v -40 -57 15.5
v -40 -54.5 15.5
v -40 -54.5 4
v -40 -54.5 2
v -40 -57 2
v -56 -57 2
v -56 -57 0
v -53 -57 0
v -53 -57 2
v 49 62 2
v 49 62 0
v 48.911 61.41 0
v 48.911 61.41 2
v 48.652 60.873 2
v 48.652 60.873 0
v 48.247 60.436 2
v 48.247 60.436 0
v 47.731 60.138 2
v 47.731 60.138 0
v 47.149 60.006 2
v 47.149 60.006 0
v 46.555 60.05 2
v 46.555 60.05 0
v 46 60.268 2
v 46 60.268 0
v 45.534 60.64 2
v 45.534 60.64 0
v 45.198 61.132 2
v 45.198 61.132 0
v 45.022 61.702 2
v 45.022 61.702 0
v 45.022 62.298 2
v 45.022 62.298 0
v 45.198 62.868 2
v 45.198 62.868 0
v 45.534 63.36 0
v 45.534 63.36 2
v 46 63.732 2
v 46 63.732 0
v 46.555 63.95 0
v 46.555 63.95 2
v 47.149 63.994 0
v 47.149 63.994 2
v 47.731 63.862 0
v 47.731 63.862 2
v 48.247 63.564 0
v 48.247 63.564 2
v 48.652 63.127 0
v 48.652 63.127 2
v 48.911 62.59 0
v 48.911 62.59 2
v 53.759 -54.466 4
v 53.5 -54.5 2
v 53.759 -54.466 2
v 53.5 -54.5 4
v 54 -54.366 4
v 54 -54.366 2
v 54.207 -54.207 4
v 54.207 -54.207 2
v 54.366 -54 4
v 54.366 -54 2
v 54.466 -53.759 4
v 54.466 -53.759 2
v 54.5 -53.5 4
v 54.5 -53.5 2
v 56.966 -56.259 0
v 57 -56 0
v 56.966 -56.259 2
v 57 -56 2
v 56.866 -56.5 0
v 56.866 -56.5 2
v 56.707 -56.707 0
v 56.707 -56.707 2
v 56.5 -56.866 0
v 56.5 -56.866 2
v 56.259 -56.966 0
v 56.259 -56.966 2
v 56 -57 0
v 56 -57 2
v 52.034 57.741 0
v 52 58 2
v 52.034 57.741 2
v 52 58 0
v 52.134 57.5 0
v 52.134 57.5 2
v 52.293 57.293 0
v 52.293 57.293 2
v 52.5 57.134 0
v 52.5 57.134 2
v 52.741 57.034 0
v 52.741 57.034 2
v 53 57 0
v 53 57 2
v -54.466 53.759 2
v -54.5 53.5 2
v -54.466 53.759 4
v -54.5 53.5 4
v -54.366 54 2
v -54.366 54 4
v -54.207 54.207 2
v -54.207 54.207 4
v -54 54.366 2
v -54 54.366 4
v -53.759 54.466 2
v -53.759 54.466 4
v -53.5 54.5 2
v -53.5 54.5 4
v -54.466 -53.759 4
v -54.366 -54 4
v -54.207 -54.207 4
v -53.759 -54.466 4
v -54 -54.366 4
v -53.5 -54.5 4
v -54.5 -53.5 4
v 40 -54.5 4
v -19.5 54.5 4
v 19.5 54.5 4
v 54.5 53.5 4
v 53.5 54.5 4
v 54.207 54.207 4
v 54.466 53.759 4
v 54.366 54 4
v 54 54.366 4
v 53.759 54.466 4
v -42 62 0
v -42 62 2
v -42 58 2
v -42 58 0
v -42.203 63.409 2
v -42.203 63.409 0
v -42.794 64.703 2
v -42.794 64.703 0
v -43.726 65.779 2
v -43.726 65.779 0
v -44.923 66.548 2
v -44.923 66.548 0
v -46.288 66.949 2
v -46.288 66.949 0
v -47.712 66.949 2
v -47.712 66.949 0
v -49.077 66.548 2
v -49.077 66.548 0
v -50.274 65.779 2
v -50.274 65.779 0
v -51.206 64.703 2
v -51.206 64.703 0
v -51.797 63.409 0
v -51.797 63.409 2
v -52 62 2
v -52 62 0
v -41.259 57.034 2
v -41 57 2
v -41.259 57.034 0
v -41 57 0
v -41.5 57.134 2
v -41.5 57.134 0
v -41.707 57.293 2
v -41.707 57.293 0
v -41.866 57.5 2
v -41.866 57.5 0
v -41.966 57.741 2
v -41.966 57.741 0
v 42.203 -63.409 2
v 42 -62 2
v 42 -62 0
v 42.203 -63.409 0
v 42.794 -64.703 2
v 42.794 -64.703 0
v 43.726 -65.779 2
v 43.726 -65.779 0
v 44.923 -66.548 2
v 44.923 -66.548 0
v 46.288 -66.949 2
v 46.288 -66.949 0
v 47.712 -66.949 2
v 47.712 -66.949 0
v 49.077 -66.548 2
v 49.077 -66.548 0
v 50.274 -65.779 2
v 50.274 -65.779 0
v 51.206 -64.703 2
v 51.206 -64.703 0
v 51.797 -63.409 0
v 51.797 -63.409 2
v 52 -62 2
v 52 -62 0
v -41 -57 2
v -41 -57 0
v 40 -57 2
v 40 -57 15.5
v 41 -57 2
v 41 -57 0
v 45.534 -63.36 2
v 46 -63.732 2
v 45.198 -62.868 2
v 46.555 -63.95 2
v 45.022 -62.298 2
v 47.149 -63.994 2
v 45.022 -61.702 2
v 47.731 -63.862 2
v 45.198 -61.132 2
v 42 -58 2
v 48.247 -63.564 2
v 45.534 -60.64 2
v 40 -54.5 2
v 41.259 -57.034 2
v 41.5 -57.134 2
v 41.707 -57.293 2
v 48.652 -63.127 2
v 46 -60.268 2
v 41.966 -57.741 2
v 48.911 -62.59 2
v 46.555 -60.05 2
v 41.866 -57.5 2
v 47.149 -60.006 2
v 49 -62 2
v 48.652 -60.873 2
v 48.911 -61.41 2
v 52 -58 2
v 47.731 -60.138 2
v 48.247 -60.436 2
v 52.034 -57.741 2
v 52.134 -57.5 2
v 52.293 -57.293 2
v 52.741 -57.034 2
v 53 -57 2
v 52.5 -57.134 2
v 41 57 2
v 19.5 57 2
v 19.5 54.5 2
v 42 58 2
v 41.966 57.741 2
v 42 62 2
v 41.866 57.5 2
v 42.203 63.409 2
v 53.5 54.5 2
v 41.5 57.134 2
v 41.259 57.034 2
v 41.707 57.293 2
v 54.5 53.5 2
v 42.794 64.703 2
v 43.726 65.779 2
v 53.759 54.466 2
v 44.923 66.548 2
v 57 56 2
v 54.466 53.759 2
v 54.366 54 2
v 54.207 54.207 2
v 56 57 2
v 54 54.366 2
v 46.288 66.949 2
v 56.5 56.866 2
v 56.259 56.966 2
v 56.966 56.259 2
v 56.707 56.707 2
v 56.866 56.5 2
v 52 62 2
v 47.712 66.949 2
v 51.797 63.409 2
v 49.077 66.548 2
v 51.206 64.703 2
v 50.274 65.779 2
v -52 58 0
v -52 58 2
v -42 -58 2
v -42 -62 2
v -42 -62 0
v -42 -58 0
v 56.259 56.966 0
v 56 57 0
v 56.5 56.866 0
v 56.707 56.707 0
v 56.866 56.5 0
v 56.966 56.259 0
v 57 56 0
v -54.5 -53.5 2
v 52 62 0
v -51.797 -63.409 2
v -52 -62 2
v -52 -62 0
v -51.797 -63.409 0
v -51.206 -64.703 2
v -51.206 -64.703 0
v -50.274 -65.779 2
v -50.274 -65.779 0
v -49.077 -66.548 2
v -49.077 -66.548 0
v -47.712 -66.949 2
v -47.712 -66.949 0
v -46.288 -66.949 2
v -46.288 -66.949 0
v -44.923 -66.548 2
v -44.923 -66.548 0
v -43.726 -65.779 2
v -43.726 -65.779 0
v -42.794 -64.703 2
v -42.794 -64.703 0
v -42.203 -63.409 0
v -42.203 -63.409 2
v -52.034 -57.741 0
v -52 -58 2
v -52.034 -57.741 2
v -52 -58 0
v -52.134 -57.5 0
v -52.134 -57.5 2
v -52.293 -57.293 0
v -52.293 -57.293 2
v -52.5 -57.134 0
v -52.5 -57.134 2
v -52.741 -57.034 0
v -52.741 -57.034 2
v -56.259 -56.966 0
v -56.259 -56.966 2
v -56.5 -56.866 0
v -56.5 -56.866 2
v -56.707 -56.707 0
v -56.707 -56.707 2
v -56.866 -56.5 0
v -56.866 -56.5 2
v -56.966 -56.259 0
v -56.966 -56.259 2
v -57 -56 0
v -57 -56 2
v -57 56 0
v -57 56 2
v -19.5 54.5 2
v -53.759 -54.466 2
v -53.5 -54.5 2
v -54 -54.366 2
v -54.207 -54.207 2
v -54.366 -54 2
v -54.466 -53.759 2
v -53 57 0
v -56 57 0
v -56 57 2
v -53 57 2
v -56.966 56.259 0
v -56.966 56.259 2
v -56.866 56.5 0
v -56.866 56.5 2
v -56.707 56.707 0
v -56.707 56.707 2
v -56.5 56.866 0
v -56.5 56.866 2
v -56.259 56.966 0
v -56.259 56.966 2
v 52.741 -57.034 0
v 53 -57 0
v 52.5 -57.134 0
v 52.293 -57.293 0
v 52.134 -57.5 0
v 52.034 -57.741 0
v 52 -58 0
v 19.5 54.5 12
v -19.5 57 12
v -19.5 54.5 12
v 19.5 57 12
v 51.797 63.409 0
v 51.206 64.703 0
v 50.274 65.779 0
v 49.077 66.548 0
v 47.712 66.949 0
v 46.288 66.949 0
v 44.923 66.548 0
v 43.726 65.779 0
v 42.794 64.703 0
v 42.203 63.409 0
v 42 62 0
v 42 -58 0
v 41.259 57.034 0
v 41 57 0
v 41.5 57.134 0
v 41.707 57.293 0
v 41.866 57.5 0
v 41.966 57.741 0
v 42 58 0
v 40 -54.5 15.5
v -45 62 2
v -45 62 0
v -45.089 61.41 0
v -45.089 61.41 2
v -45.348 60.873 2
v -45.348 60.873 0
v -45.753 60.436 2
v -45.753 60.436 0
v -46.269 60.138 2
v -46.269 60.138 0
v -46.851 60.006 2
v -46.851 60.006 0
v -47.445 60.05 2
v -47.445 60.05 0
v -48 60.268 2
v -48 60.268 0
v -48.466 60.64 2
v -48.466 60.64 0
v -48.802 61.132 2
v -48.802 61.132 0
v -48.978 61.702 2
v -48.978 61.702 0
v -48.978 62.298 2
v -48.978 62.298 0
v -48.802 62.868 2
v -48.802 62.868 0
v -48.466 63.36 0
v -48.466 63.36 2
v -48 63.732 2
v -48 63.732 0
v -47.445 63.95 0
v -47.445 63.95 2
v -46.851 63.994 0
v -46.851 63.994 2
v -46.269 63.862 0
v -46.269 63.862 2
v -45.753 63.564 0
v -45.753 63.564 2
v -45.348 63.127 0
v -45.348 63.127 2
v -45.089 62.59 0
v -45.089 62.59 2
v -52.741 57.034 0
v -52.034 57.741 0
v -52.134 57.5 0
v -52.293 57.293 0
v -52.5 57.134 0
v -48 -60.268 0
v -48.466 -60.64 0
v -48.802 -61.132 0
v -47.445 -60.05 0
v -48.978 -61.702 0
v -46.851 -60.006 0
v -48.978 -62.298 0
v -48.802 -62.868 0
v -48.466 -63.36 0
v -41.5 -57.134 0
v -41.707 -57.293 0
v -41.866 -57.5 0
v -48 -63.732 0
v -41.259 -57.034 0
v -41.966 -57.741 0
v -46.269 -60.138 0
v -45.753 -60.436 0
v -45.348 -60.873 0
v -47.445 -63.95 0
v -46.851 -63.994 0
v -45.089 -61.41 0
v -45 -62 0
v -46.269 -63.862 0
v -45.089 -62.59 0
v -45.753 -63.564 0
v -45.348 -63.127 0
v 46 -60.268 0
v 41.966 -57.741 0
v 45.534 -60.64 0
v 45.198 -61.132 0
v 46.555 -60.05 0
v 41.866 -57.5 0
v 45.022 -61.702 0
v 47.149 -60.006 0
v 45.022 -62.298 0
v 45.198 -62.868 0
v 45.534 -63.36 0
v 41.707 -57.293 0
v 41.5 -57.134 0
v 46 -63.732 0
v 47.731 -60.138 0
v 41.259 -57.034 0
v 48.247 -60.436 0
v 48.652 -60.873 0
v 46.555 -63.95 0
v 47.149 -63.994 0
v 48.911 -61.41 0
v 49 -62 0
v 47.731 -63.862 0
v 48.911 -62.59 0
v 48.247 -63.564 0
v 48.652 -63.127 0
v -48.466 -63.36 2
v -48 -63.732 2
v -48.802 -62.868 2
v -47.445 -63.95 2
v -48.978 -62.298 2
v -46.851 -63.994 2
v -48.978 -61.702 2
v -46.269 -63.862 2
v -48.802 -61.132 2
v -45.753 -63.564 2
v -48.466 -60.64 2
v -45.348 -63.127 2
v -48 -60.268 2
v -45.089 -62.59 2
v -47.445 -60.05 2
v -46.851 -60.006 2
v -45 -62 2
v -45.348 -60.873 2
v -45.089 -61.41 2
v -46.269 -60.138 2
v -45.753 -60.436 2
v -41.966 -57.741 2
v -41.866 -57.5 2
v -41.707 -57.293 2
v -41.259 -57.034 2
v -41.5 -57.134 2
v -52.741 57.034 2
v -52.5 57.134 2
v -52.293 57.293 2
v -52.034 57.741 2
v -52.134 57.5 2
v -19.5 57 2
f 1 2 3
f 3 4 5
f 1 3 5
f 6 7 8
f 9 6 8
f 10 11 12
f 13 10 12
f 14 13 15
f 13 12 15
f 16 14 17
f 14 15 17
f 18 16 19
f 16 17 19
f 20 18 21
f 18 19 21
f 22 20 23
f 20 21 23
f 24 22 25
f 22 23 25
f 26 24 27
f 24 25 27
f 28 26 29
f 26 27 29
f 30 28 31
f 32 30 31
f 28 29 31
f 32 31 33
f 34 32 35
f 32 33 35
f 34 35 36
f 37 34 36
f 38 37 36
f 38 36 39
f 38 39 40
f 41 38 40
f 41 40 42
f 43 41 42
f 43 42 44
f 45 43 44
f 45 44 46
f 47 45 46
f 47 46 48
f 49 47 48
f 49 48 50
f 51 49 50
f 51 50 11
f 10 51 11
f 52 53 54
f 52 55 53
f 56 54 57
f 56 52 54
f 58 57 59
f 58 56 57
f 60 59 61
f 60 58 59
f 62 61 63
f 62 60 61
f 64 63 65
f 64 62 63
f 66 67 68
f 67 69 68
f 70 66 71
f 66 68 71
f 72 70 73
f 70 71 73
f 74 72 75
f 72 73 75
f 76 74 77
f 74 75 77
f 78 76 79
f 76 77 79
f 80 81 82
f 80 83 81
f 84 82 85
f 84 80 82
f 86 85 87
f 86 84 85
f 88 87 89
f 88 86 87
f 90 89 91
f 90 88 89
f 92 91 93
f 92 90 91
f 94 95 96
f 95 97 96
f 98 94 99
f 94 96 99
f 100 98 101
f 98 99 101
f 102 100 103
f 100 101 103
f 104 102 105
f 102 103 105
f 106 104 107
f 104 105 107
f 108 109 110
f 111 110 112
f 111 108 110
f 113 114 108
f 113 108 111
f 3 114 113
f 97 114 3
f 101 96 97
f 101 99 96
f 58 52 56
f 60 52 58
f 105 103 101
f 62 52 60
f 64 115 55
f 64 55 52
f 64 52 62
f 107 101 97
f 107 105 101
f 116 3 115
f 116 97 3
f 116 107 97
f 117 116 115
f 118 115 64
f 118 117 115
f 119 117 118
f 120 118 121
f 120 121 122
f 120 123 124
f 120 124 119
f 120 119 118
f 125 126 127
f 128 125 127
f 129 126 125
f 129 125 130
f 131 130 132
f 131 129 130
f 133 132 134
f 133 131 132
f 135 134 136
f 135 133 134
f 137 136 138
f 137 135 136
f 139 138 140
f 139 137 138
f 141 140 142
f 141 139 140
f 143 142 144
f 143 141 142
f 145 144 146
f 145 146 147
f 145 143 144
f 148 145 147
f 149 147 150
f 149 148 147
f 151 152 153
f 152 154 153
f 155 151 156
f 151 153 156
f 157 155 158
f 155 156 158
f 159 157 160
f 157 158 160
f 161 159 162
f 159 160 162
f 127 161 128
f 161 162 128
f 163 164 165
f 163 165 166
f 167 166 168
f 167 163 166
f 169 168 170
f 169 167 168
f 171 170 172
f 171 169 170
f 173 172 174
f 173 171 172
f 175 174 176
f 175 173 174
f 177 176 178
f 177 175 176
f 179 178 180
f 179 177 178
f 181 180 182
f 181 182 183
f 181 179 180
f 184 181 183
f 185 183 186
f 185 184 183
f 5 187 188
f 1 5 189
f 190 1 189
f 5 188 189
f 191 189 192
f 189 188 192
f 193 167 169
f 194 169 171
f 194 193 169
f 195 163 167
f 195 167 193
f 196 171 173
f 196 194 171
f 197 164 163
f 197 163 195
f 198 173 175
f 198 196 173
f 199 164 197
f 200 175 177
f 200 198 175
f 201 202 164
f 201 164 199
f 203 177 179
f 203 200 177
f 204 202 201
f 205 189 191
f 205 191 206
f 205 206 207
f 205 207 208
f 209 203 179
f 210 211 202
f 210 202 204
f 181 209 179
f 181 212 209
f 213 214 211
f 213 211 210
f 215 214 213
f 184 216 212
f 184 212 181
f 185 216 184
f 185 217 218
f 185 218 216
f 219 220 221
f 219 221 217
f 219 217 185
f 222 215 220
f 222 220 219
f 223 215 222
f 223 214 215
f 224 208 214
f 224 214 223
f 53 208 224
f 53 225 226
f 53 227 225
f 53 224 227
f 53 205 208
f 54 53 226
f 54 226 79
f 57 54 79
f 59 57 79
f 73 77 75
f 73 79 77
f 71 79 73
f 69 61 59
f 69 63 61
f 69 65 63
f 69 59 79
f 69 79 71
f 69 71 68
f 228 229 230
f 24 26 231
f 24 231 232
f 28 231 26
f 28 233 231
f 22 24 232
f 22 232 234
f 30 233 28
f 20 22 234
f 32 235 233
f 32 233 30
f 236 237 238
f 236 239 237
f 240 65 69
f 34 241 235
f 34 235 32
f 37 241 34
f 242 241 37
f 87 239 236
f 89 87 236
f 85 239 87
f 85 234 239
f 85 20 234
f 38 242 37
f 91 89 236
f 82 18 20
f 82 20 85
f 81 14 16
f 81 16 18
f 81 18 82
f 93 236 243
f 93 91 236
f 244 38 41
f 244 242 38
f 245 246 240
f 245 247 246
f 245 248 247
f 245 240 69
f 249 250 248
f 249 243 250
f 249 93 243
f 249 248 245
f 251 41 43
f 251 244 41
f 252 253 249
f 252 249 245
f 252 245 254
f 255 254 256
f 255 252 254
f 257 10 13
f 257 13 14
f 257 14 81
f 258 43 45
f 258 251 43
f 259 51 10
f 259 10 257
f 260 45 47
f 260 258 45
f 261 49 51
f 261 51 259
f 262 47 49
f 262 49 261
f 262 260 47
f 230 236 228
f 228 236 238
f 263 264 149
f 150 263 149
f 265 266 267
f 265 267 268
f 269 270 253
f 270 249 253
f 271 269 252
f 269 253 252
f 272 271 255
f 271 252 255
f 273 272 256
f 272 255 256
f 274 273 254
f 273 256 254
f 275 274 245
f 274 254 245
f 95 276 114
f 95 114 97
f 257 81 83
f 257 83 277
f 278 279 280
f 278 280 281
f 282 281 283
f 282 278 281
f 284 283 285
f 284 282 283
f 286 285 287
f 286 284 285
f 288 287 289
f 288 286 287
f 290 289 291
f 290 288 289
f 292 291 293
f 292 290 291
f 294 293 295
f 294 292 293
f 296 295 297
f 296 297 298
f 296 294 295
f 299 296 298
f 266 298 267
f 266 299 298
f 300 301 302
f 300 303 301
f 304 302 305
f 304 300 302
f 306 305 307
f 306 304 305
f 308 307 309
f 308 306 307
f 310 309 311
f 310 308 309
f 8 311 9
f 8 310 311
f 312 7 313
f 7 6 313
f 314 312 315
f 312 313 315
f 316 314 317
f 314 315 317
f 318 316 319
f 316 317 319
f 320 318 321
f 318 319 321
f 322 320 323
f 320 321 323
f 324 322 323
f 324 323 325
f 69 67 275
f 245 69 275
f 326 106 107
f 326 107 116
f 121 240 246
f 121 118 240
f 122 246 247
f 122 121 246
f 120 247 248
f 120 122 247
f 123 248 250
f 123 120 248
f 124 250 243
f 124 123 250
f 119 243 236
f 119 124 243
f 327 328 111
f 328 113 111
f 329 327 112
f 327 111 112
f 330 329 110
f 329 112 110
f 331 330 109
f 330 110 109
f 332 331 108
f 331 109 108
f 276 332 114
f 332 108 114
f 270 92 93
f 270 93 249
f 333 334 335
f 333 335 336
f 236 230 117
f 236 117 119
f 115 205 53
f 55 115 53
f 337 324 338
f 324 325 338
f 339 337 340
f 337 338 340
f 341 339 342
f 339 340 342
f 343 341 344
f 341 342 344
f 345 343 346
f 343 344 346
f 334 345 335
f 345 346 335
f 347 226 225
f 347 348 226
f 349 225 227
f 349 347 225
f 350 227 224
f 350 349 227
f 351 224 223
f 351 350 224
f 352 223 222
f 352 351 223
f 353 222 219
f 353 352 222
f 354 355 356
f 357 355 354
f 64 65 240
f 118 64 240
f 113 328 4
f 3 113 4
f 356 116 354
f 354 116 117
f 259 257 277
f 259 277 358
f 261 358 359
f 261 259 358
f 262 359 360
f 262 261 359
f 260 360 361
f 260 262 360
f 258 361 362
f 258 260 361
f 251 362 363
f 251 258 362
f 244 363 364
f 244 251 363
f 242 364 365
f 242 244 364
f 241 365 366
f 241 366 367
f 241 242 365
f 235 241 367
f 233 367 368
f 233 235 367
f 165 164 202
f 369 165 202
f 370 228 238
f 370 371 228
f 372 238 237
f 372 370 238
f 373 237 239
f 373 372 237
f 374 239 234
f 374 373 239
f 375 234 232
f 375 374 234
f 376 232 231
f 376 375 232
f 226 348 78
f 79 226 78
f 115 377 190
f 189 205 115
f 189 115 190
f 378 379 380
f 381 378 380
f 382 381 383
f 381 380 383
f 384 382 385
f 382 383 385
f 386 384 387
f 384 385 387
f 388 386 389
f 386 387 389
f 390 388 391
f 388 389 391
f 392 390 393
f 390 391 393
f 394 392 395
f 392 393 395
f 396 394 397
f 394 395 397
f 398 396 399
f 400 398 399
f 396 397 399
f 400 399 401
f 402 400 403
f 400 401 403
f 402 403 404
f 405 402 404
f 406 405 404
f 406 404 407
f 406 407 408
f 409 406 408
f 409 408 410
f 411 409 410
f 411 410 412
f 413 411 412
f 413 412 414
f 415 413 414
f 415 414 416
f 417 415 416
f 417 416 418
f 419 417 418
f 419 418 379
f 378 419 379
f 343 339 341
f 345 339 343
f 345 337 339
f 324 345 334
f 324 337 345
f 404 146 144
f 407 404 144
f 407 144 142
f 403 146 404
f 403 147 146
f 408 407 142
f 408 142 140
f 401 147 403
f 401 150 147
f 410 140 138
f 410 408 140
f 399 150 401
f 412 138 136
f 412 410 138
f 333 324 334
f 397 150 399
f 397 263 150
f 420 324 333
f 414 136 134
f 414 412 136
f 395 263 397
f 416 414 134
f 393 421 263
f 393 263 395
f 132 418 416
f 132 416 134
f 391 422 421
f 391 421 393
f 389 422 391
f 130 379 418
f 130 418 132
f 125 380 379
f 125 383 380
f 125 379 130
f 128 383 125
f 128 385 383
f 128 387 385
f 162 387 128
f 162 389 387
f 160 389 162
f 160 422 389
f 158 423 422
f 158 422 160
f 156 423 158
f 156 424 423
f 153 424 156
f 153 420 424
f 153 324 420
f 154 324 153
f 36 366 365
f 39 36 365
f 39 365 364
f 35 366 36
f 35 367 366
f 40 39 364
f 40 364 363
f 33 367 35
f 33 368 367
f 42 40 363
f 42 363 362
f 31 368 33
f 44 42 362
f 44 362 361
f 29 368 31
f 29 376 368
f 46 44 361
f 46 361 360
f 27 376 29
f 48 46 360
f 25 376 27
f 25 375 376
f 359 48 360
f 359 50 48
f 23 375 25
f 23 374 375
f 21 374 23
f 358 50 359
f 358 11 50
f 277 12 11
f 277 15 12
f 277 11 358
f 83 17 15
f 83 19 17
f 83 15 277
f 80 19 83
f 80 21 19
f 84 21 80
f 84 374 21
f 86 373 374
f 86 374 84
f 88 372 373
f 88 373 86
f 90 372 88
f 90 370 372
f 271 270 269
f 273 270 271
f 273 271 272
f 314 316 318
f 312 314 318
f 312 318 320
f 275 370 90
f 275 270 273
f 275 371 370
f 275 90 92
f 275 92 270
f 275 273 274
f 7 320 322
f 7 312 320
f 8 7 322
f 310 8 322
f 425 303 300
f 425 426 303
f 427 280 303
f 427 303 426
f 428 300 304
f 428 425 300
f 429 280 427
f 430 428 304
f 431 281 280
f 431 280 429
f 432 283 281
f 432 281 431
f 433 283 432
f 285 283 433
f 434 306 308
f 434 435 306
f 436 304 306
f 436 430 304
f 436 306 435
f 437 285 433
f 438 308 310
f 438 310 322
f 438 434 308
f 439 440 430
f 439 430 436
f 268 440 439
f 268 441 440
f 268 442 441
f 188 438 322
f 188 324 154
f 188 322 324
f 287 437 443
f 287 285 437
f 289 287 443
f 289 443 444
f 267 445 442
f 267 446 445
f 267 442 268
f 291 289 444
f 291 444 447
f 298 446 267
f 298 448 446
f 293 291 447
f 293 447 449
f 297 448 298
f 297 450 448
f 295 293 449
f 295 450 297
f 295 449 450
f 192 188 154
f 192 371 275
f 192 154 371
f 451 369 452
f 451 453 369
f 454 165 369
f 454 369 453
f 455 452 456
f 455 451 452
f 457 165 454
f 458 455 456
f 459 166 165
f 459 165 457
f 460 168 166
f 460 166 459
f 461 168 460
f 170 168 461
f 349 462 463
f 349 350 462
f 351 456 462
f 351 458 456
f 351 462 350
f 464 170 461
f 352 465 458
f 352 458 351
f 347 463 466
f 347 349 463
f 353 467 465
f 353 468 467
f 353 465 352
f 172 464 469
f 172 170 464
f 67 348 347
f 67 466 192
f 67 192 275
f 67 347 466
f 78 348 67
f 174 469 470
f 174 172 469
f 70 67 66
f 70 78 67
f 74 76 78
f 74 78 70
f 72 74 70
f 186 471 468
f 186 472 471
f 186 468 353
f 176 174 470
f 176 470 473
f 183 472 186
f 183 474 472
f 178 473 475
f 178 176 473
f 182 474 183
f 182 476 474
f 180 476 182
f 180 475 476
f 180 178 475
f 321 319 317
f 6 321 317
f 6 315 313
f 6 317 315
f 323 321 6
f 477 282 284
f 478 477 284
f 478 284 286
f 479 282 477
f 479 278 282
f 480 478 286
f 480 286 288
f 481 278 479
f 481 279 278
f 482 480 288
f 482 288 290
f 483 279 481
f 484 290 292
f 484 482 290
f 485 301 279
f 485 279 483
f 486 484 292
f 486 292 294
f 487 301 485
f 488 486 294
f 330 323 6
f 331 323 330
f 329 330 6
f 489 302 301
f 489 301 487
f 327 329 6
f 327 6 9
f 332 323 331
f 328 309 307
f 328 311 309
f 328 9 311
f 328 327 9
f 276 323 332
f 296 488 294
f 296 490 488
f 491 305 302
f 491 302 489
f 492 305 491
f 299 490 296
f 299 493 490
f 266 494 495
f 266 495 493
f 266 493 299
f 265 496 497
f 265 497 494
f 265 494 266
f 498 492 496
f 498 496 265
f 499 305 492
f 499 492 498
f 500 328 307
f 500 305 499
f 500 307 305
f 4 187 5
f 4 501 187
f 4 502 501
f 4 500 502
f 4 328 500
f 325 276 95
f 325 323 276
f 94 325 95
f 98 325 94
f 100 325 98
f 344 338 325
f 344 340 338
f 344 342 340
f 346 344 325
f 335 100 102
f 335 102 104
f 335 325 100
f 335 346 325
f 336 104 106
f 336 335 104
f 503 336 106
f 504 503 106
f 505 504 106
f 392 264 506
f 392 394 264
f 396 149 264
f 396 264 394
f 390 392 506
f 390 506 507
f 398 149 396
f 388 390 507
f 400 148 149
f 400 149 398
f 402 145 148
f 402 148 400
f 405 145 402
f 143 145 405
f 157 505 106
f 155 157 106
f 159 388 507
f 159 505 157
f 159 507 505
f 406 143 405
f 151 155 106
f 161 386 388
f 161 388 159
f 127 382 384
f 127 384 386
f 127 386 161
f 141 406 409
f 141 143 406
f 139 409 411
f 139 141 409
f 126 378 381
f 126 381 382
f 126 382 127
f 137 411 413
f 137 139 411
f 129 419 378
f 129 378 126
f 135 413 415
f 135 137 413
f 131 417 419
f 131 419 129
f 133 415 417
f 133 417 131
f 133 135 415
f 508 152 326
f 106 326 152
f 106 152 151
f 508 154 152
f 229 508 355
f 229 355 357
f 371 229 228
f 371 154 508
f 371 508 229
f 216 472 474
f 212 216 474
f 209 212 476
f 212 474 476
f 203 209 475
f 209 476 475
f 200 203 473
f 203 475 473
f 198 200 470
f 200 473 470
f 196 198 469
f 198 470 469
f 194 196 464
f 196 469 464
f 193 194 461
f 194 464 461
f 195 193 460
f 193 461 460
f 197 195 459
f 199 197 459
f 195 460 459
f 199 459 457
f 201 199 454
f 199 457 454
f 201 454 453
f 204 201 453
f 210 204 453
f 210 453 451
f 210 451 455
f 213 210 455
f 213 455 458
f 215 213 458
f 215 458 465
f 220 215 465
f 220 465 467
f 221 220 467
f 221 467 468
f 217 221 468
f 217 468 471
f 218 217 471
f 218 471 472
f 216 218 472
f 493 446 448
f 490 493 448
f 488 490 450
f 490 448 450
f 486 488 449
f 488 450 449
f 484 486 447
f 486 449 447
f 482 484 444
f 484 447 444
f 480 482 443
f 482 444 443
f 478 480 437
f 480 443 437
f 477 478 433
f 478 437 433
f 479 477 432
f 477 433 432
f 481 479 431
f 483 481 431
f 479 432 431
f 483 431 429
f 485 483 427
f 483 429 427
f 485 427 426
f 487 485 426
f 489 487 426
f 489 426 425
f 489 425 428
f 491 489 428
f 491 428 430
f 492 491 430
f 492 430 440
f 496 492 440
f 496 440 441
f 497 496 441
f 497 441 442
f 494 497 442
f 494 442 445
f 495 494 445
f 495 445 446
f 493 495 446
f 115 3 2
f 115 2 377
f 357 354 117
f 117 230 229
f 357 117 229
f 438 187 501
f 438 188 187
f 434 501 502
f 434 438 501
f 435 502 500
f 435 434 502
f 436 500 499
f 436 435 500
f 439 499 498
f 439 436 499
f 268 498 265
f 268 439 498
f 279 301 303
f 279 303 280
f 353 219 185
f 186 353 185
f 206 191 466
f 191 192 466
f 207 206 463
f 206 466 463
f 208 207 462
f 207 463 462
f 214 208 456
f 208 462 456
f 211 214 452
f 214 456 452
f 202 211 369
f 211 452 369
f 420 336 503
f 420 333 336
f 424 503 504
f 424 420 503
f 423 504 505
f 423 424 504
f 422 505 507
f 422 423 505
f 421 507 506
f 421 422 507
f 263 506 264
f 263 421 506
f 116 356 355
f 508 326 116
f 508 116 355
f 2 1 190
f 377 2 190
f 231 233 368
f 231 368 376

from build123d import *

# Parameters (mm, degrees)
SKETCH_W     = 114
SKETCH_H     = 114
PAD_DEPTH    = 2
SKETCH001_W  = 109
SKETCH001_H  = 109
PAD001_DEPTH = 2
PAD002_DEPTH = 2
SKETCH003_R  = 2
HOLE_DEPTH   = 4.001
FILLET_R     = 1
SKETCH004_W  = 80
SKETCH004_H  = 2.5
PAD003_DEPTH = 15.5
SKETCH005_W  = 39
SKETCH005_H  = 2.5
PAD004_DEPTH = 10
FILLET001_R  = 1


with BuildPart() as part:
    # Sketch → Pad (new body)
    with BuildSketch(Plane.XY):
        Rectangle(SKETCH_W, SKETCH_H)
    extrude(amount=PAD_DEPTH)

    # Sketch001 (on Face6 of Pad) → Pad001 (join)
    with BuildSketch(Plane.XY.offset(2)):
        Rectangle(SKETCH001_W, SKETCH001_H)
    extrude(amount=PAD001_DEPTH)

    # Sketch002 (on Face5 of Pad001) → Pad002 (join)
    with BuildSketch(Plane.XY.offset(2)):
        with BuildLine():
            ThreePointArc((52, 62), (47, 67), (42, 62))
            Line((42, 62), (42, 57))
            Line((42, 57), (52, 57))
            Line((52, 57), (52, 62))
        make_face()
        with BuildLine():
            ThreePointArc((-42, 62), (-47, 67), (-52, 62))
            Line((-52, 57), (-52, 62))
            Line((-42, 57), (-52, 57))
            Line((-42, 62), (-42, 57))
        make_face()
        with BuildLine():
            ThreePointArc((42, -62), (47, -67), (52, -62))
            Line((52, -57), (52, -62))
            Line((42, -57), (52, -57))
            Line((42, -62), (42, -57))
        make_face()
        with BuildLine():
            ThreePointArc((-52, -62), (-47, -67), (-42, -62))
            Line((-42, -62), (-42, -57))
            Line((-42, -57), (-52, -57))
            Line((-52, -57), (-52, -62))
        make_face()
    extrude(amount=-PAD002_DEPTH)

    # Sketch003 (on Face21 of Pad002) → Hole (cut, through all)
    with BuildSketch(Plane(origin=(0, 0, 0), x_dir=(1, 0, 0), z_dir=(0, 0, -1))):
        with Locations((-47, 62)):
            Circle(SKETCH003_R)
        with Locations((47, 62)):
            Circle(SKETCH003_R)
        with Locations((47, -62)):
            Circle(SKETCH003_R)
        with Locations((-47, -62)):
            Circle(SKETCH003_R)
    extrude(amount=-HOLE_DEPTH, mode=Mode.SUBTRACT)

    # Fillet
    fillet_edges = [part.edges().sort_by_distance(p)[0] for p in [
        (54.5, 54.5, 3),
        (-54.5, 54.5, 3),
        (-54.5, -54.5, 3),
        (54.5, -54.5, 3),
    ]]
    fillet(fillet_edges, radius=FILLET_R)

    # Sketch004 (on Face35 of Fillet) → Pad003 (join)
    with BuildSketch(Plane(origin=(0, 0, 0), x_dir=(1, 0, 0), z_dir=(0, 0, -1))):
        with Locations((0, 55.75)):
            Rectangle(SKETCH004_W, SKETCH004_H)
    extrude(amount=-PAD003_DEPTH)

    # Sketch005 (on Face1 of Pad003) → Pad004 (join)
    with BuildSketch(Plane.XY.offset(2)):
        with Locations((0, 55.75)):
            Rectangle(SKETCH005_W, SKETCH005_H)
    extrude(amount=PAD004_DEPTH)

    # Fillet001
    fillet001_edges = [part.edges().sort_by_distance(p)[0] for p in [
        (57, 57, 1),
        (-57, 57, 1),
        (-57, -57, 1),
        (57, -57, 1),
        (52, 57, 1),
        (52, -57, 1),
        (-42, -57, 1),
        (42, -57, 1),
        (-52, -57, 1),
        (-52, 57, 1),
        (42, 57, 1),
        (-42, 57, 1),
    ]]
    fillet(fillet001_edges, radius=FILLET001_R)


solid = part.part
